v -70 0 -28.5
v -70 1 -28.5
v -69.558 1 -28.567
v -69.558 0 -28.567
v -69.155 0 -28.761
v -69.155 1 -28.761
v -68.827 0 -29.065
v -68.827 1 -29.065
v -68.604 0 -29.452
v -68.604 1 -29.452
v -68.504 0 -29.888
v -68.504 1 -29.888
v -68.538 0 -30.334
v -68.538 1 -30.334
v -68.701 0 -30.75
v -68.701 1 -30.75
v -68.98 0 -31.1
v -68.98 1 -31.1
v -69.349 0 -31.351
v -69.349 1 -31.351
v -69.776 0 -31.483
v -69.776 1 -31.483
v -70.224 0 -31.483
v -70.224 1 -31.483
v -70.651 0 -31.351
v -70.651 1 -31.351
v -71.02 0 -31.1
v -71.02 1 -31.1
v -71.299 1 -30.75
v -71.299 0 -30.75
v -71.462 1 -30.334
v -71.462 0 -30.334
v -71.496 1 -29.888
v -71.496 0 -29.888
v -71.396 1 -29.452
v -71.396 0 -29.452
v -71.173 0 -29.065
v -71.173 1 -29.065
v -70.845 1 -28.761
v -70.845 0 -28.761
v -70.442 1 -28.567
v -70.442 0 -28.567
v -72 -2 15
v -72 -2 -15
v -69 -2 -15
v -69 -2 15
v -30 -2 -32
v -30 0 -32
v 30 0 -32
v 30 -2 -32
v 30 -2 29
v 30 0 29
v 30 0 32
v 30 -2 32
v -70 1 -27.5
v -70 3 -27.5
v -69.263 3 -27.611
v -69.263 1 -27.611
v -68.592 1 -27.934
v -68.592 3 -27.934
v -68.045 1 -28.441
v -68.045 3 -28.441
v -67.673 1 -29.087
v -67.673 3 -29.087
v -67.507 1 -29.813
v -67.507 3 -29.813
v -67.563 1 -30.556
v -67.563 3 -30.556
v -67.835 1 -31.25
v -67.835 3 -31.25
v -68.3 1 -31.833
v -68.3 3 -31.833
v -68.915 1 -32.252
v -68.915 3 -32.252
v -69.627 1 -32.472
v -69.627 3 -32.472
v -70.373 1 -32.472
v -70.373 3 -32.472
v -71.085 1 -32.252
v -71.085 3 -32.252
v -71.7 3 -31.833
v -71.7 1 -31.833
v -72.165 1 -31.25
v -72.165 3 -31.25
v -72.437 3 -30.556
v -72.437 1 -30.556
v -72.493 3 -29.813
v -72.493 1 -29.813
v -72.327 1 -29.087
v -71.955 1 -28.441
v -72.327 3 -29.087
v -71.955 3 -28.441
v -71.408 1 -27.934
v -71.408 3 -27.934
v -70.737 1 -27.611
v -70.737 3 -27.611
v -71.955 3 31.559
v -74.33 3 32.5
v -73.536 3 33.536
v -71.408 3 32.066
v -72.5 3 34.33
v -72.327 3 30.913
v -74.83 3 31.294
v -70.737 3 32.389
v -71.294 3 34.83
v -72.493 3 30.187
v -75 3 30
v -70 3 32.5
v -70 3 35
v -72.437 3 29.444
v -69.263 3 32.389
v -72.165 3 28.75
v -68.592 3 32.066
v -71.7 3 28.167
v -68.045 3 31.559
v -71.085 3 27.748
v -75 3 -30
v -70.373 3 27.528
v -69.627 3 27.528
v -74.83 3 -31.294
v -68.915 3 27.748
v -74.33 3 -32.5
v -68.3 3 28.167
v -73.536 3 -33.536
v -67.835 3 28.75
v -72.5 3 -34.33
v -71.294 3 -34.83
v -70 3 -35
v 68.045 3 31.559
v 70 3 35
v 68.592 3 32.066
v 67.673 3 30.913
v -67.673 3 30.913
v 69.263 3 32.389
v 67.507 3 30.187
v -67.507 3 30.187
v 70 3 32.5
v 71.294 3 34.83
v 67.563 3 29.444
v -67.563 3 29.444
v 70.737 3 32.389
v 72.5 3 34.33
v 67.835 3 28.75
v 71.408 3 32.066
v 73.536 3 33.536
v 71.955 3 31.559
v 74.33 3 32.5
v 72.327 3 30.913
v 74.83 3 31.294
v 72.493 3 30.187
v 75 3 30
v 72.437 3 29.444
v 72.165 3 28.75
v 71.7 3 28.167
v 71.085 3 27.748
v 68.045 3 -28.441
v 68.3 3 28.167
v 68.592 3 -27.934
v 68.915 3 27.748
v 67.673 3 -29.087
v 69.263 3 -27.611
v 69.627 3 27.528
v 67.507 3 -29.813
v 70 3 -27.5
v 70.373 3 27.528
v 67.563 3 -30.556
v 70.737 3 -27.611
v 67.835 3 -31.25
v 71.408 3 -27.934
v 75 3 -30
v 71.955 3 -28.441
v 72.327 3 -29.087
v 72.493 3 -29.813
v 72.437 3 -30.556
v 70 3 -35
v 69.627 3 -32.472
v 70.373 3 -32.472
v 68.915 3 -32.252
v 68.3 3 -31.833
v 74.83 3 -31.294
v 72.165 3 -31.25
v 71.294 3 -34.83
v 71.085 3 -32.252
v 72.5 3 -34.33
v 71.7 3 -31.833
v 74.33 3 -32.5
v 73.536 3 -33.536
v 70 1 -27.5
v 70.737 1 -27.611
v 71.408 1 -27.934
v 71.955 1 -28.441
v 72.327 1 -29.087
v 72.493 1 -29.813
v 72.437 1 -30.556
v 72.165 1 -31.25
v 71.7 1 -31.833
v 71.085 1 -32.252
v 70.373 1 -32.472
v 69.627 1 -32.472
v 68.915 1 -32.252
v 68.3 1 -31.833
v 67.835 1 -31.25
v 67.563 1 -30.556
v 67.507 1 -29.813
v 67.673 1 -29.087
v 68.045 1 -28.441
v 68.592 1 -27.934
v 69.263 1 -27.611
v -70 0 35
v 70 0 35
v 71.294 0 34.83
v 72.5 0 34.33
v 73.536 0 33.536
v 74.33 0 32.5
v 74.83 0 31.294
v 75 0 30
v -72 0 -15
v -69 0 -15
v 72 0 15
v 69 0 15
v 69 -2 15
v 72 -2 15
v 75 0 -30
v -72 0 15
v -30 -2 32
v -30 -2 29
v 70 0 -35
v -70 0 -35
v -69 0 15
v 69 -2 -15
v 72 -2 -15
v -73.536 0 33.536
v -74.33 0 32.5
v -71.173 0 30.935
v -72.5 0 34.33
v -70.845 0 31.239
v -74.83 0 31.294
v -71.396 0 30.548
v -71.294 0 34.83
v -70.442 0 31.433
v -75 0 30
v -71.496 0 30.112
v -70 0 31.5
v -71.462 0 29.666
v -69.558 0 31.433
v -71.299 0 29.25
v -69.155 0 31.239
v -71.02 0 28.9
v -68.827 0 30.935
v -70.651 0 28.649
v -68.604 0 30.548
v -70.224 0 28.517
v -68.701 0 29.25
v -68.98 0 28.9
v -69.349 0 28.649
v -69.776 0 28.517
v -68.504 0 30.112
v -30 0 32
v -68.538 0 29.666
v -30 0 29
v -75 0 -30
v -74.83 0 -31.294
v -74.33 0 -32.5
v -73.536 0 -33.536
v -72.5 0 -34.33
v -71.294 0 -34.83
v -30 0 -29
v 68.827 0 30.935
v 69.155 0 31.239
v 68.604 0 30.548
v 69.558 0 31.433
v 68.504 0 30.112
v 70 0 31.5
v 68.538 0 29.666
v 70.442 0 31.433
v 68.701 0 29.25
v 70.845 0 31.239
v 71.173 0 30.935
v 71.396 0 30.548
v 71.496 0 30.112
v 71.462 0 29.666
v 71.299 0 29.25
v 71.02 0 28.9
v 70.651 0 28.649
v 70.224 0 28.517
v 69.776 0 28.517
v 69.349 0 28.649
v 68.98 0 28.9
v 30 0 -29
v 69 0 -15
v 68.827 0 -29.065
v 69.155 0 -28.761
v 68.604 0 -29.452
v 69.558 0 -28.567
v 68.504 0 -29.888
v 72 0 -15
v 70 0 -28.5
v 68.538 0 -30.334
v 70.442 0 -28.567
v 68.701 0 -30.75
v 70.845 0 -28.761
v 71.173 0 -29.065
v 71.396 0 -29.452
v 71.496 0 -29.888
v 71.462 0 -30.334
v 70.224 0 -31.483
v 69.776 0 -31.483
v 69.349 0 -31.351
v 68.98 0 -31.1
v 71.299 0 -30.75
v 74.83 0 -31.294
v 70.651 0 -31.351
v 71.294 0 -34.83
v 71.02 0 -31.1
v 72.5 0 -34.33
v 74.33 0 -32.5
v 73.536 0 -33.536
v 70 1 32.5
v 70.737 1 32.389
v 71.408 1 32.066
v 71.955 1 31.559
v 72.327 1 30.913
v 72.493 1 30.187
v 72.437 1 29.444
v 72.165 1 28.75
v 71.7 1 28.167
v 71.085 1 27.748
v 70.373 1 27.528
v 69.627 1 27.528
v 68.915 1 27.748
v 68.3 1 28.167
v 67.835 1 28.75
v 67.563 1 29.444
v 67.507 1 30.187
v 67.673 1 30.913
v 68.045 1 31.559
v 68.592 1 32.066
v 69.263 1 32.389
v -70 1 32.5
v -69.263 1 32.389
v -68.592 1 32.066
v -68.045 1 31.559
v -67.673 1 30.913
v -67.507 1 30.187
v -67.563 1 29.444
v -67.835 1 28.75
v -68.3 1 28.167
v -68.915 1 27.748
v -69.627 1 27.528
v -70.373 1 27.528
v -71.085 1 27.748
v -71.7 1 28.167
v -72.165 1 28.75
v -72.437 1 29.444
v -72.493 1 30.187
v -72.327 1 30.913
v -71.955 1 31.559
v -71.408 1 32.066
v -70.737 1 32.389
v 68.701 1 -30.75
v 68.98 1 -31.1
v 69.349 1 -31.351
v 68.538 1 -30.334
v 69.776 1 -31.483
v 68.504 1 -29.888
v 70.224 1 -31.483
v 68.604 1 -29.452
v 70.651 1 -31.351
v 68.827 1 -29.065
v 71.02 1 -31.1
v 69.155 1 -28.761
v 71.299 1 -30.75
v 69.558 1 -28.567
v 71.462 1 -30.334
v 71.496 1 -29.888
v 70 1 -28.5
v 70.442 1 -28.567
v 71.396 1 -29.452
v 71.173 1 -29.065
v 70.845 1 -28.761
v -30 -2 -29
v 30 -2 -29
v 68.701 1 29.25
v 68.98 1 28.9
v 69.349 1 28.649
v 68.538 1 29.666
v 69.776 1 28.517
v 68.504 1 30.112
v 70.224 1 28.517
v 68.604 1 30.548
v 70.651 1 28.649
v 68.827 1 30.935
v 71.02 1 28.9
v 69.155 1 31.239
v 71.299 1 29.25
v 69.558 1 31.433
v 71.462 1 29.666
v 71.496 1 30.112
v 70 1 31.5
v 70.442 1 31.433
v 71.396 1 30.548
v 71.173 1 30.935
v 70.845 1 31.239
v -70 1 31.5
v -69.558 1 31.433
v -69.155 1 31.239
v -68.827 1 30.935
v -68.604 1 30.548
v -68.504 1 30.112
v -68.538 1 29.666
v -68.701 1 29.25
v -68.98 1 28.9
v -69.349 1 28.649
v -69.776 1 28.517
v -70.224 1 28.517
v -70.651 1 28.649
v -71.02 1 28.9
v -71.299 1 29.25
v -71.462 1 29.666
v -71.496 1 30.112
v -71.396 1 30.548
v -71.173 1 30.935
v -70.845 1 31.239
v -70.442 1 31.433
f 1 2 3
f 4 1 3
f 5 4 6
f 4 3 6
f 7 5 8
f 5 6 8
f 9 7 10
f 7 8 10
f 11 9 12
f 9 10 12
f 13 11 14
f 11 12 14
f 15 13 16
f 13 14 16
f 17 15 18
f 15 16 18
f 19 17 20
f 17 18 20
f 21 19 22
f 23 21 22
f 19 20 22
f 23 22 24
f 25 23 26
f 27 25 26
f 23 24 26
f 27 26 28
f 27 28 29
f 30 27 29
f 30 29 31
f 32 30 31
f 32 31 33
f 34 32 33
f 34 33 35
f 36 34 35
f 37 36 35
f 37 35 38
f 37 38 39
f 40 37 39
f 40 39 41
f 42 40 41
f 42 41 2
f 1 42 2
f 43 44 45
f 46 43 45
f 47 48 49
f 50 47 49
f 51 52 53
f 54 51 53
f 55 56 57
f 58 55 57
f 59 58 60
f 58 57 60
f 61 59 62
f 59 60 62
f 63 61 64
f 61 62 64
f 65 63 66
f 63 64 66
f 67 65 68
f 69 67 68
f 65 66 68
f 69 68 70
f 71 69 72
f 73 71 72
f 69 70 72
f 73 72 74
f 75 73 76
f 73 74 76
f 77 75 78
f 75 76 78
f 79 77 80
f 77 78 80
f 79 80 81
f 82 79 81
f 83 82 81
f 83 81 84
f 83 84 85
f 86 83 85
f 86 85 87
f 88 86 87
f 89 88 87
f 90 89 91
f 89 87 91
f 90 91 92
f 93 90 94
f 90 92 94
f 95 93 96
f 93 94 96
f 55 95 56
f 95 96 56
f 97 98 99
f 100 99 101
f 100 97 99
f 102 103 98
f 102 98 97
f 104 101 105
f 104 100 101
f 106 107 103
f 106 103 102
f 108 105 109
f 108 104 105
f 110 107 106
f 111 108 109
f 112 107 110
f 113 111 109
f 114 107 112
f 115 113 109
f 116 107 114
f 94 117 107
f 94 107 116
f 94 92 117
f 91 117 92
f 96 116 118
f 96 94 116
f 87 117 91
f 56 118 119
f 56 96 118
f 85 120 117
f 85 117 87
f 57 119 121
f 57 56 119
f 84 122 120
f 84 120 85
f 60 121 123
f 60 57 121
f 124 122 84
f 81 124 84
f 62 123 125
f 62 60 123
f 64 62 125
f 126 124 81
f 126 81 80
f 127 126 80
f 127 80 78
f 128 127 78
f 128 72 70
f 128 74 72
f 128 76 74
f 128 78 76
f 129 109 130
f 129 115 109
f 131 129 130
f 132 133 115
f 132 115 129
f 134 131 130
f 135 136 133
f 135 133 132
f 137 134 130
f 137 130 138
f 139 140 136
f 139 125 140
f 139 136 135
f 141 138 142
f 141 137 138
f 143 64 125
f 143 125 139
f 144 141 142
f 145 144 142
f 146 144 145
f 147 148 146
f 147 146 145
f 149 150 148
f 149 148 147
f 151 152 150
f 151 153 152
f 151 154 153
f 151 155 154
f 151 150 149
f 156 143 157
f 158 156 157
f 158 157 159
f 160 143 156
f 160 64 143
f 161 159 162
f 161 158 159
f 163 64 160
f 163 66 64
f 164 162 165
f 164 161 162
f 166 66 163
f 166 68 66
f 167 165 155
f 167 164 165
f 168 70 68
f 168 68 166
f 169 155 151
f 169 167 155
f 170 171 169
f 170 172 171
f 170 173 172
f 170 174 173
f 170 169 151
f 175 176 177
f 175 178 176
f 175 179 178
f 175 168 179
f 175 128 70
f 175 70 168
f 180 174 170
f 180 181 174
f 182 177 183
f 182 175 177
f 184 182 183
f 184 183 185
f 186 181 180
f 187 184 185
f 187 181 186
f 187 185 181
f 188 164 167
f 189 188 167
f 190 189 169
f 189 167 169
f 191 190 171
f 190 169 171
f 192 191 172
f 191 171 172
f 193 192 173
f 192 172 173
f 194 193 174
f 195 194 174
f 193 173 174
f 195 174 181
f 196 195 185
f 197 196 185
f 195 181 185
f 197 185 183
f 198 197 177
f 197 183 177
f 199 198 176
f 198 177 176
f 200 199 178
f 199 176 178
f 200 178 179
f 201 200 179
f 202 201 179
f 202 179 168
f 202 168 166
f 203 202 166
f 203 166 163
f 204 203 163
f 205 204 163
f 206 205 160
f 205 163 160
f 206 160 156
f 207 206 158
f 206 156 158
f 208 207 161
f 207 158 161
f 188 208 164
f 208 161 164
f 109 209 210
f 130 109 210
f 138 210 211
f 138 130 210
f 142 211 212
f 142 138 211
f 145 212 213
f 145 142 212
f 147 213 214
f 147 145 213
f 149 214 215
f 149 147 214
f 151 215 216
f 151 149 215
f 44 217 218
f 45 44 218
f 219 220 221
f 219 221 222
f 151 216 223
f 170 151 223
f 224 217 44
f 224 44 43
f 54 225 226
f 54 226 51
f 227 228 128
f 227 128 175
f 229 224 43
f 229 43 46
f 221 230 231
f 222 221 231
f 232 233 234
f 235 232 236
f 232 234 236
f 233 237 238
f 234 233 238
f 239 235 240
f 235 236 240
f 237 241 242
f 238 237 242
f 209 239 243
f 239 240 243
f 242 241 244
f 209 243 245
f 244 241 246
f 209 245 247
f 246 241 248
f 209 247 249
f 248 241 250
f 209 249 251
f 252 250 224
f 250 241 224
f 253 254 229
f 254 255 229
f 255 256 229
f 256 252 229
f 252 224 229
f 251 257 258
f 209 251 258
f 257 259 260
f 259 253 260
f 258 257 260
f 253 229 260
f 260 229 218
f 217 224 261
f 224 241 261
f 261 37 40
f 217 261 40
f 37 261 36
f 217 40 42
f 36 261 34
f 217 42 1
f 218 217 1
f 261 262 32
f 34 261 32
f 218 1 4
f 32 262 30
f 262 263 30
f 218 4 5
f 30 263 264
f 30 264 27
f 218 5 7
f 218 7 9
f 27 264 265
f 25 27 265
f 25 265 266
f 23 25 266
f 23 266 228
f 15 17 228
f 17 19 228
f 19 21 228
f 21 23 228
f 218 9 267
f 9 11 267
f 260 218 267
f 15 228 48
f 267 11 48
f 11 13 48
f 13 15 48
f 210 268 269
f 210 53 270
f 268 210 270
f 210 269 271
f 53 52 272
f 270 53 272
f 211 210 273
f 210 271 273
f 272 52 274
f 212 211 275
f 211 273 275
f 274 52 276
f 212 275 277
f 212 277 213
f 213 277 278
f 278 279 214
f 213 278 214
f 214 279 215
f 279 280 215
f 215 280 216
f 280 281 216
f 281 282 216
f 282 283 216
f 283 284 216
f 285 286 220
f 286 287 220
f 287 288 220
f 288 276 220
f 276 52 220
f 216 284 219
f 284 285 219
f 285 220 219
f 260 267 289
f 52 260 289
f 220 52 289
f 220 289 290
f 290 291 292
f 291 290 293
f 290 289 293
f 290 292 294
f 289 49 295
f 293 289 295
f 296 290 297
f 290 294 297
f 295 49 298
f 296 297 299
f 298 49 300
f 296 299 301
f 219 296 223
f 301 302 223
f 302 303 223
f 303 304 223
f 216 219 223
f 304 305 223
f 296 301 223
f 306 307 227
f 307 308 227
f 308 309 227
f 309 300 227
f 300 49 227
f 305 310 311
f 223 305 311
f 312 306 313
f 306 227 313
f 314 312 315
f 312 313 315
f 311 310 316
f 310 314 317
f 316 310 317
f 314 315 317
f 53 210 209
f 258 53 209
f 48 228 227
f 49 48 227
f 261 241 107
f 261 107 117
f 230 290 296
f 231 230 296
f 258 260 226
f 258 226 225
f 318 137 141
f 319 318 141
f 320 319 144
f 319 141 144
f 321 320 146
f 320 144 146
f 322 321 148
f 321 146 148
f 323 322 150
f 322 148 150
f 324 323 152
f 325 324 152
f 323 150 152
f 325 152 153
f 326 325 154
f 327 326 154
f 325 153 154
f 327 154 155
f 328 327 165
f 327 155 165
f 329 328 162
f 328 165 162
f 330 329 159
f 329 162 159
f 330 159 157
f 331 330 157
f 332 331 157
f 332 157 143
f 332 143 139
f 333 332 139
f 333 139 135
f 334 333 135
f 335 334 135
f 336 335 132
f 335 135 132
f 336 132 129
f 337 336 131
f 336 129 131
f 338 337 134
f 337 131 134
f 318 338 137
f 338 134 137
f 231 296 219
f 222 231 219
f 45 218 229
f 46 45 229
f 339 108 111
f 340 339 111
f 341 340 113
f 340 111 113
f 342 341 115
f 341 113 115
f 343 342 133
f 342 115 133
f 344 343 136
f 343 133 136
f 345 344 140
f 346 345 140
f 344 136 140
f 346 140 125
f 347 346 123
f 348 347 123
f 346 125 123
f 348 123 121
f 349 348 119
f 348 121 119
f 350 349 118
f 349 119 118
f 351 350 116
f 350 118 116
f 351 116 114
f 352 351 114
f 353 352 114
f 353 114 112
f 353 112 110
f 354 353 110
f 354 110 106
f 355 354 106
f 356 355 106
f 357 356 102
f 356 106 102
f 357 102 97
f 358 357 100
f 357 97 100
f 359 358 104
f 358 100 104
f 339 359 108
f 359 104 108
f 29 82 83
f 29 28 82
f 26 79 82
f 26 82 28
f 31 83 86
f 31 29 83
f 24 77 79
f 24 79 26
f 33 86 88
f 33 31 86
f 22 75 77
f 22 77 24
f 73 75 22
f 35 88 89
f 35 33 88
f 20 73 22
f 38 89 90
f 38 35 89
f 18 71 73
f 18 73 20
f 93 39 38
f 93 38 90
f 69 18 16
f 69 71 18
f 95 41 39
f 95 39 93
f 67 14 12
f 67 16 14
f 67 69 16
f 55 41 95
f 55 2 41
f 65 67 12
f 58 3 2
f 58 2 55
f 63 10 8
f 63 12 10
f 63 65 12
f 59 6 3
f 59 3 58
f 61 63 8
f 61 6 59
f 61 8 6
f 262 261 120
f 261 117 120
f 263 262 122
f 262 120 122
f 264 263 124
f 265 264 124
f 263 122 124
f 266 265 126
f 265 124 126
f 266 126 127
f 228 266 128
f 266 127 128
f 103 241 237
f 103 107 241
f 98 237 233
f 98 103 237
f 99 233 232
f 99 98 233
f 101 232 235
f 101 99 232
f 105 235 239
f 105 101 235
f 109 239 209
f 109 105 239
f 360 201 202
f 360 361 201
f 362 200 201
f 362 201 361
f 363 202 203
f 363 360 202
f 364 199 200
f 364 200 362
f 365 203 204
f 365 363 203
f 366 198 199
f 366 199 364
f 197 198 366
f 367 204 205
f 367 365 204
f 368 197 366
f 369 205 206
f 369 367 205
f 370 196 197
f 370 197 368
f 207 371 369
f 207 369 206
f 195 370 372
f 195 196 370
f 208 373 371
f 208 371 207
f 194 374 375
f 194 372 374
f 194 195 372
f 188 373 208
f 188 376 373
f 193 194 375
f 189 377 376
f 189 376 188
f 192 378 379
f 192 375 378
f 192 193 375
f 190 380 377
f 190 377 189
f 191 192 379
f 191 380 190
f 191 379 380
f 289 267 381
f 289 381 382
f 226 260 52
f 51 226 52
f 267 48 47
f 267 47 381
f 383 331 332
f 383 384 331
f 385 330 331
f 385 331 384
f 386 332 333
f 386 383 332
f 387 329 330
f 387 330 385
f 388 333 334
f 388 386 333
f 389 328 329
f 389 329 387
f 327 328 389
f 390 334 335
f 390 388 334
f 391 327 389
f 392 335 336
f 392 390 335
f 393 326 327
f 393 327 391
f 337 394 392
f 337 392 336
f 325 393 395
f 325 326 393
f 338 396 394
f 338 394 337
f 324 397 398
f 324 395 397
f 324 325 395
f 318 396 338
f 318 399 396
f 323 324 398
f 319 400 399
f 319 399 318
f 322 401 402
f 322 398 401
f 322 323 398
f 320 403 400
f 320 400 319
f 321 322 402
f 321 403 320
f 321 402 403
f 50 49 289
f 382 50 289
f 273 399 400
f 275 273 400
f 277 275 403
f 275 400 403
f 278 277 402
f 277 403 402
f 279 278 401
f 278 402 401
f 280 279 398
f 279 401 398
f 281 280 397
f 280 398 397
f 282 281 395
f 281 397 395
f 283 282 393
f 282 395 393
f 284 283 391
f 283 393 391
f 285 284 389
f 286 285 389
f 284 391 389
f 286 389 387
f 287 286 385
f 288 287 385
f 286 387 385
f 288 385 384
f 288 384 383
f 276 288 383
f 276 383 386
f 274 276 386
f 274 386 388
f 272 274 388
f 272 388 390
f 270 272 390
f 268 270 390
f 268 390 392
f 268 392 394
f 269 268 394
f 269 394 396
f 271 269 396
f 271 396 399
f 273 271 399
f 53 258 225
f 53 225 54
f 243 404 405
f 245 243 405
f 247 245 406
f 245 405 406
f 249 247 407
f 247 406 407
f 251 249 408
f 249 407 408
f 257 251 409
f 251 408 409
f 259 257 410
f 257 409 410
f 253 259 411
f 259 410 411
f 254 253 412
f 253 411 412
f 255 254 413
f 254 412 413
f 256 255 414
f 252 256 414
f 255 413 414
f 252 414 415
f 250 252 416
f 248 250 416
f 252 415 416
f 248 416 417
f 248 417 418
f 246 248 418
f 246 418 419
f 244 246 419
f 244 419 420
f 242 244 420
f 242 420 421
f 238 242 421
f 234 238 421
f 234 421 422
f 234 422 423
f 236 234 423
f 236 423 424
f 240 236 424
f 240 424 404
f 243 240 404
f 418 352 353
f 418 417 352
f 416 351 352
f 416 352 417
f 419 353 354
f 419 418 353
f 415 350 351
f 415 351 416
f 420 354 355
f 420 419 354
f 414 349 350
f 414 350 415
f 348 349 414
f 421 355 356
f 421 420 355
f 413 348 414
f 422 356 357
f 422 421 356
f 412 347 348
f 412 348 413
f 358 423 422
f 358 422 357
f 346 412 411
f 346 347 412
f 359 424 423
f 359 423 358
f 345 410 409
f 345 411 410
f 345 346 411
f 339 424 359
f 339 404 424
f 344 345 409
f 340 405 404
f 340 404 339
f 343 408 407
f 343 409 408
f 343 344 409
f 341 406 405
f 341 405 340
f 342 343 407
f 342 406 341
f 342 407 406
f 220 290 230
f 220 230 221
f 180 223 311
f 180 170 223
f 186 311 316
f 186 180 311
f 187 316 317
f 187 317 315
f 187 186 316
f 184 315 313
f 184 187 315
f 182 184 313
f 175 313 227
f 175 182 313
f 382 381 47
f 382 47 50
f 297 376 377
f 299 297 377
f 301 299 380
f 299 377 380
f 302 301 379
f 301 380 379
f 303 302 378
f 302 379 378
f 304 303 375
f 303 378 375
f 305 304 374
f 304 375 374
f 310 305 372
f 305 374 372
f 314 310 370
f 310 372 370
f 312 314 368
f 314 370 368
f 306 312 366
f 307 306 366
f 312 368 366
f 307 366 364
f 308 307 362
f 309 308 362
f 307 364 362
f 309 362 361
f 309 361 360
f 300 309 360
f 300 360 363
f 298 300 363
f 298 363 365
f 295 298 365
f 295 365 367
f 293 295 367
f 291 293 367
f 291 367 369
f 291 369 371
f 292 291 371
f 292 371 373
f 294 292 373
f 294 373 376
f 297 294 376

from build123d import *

# Parameters (mm, degrees)
SKETCH_1_W          = 150
SKETCH_1_H          = 70
EXTRUDE_1_DEPTH     = 3
FILLET_1_R          = 5
SKETCH_2_R          = 1.5
CUT_EXTRUDE_1_DEPTH = 3
SKETCH_3_R          = 2.5
CUT_EXTRUDE_2_DEPTH = 2
SKETCH_4_W          = 3
SKETCH_4_H          = 30
SKETCH_4_W_2        = 60
SKETCH_4_H_2        = 3
EXTRUDE_2_DEPTH     = 2


with BuildPart() as part:
    # Эскиз1 → Бобышка-Вытянуть1 (new body)
    with BuildSketch(Plane(origin=(0, 0, 0), x_dir=(1, 0, 0), z_dir=(0, 1, 0))):
        Rectangle(SKETCH_1_W, SKETCH_1_H)
    extrude(amount=EXTRUDE_1_DEPTH)

    # Скругление1
    fillet_1_edges = [part.edges().sort_by_distance(p)[0] for p in [
        (75, 1.5, -35),
        (75, 1.5, 35),
        (-75, 1.5, 35),
        (-75, 1.5, -35),
    ]]
    fillet(fillet_1_edges, radius=FILLET_1_R)

    # Эскиз2 → Вырез-Вытянуть1 (cut)
    with BuildSketch(Plane(origin=(0, 3, 0), x_dir=(1, 0, 0), z_dir=(0, 1, 0))):
        with Locations(Location((-70, 30, 0), (0, 0, 270))):
            Circle(SKETCH_2_R)
        with Locations(Location((70, 30, 0), (0, 0, 270))):
            Circle(SKETCH_2_R)
        with Locations(Location((70, -30, 0), (0, 0, 270))):
            Circle(SKETCH_2_R)
        with Locations(Location((-70, -30, 0), (0, 0, 270))):
            Circle(SKETCH_2_R)
    extrude(amount=-CUT_EXTRUDE_1_DEPTH, mode=Mode.SUBTRACT)

    # Эскиз3 → Вырез-Вытянуть2 (cut)
    with BuildSketch(Plane(origin=(0, 3, 0), x_dir=(1, 0, 0), z_dir=(0, 1, 0))):
        with Locations(Location((-70, 30, 0), (0, 0, 270))):
            Circle(SKETCH_3_R)
        with Locations(Location((70, 30, 0), (0, 0, 270))):
            Circle(SKETCH_3_R)
        with Locations(Location((70, -30, 0), (0, 0, 270))):
            Circle(SKETCH_3_R)
        with Locations(Location((-70, -30, 0), (0, 0, 270))):
            Circle(SKETCH_3_R)
    extrude(amount=-CUT_EXTRUDE_2_DEPTH, mode=Mode.SUBTRACT)

    # Эскиз4 → Бобышка-Вытянуть2 (add)
    with BuildSketch(Plane.XZ):
        with Locations((-70.5, 0)):
            Rectangle(SKETCH_4_W, SKETCH_4_H)
        with Locations((0, -30.5)):
            Rectangle(SKETCH_4_W_2, SKETCH_4_H_2)
        with Locations((70.5, 0)):
            Rectangle(SKETCH_4_W, SKETCH_4_H)
        with Locations((0, 30.5)):
            Rectangle(SKETCH_4_W_2, SKETCH_4_H_2)
    extrude(amount=EXTRUDE_2_DEPTH)


solid = part.part
